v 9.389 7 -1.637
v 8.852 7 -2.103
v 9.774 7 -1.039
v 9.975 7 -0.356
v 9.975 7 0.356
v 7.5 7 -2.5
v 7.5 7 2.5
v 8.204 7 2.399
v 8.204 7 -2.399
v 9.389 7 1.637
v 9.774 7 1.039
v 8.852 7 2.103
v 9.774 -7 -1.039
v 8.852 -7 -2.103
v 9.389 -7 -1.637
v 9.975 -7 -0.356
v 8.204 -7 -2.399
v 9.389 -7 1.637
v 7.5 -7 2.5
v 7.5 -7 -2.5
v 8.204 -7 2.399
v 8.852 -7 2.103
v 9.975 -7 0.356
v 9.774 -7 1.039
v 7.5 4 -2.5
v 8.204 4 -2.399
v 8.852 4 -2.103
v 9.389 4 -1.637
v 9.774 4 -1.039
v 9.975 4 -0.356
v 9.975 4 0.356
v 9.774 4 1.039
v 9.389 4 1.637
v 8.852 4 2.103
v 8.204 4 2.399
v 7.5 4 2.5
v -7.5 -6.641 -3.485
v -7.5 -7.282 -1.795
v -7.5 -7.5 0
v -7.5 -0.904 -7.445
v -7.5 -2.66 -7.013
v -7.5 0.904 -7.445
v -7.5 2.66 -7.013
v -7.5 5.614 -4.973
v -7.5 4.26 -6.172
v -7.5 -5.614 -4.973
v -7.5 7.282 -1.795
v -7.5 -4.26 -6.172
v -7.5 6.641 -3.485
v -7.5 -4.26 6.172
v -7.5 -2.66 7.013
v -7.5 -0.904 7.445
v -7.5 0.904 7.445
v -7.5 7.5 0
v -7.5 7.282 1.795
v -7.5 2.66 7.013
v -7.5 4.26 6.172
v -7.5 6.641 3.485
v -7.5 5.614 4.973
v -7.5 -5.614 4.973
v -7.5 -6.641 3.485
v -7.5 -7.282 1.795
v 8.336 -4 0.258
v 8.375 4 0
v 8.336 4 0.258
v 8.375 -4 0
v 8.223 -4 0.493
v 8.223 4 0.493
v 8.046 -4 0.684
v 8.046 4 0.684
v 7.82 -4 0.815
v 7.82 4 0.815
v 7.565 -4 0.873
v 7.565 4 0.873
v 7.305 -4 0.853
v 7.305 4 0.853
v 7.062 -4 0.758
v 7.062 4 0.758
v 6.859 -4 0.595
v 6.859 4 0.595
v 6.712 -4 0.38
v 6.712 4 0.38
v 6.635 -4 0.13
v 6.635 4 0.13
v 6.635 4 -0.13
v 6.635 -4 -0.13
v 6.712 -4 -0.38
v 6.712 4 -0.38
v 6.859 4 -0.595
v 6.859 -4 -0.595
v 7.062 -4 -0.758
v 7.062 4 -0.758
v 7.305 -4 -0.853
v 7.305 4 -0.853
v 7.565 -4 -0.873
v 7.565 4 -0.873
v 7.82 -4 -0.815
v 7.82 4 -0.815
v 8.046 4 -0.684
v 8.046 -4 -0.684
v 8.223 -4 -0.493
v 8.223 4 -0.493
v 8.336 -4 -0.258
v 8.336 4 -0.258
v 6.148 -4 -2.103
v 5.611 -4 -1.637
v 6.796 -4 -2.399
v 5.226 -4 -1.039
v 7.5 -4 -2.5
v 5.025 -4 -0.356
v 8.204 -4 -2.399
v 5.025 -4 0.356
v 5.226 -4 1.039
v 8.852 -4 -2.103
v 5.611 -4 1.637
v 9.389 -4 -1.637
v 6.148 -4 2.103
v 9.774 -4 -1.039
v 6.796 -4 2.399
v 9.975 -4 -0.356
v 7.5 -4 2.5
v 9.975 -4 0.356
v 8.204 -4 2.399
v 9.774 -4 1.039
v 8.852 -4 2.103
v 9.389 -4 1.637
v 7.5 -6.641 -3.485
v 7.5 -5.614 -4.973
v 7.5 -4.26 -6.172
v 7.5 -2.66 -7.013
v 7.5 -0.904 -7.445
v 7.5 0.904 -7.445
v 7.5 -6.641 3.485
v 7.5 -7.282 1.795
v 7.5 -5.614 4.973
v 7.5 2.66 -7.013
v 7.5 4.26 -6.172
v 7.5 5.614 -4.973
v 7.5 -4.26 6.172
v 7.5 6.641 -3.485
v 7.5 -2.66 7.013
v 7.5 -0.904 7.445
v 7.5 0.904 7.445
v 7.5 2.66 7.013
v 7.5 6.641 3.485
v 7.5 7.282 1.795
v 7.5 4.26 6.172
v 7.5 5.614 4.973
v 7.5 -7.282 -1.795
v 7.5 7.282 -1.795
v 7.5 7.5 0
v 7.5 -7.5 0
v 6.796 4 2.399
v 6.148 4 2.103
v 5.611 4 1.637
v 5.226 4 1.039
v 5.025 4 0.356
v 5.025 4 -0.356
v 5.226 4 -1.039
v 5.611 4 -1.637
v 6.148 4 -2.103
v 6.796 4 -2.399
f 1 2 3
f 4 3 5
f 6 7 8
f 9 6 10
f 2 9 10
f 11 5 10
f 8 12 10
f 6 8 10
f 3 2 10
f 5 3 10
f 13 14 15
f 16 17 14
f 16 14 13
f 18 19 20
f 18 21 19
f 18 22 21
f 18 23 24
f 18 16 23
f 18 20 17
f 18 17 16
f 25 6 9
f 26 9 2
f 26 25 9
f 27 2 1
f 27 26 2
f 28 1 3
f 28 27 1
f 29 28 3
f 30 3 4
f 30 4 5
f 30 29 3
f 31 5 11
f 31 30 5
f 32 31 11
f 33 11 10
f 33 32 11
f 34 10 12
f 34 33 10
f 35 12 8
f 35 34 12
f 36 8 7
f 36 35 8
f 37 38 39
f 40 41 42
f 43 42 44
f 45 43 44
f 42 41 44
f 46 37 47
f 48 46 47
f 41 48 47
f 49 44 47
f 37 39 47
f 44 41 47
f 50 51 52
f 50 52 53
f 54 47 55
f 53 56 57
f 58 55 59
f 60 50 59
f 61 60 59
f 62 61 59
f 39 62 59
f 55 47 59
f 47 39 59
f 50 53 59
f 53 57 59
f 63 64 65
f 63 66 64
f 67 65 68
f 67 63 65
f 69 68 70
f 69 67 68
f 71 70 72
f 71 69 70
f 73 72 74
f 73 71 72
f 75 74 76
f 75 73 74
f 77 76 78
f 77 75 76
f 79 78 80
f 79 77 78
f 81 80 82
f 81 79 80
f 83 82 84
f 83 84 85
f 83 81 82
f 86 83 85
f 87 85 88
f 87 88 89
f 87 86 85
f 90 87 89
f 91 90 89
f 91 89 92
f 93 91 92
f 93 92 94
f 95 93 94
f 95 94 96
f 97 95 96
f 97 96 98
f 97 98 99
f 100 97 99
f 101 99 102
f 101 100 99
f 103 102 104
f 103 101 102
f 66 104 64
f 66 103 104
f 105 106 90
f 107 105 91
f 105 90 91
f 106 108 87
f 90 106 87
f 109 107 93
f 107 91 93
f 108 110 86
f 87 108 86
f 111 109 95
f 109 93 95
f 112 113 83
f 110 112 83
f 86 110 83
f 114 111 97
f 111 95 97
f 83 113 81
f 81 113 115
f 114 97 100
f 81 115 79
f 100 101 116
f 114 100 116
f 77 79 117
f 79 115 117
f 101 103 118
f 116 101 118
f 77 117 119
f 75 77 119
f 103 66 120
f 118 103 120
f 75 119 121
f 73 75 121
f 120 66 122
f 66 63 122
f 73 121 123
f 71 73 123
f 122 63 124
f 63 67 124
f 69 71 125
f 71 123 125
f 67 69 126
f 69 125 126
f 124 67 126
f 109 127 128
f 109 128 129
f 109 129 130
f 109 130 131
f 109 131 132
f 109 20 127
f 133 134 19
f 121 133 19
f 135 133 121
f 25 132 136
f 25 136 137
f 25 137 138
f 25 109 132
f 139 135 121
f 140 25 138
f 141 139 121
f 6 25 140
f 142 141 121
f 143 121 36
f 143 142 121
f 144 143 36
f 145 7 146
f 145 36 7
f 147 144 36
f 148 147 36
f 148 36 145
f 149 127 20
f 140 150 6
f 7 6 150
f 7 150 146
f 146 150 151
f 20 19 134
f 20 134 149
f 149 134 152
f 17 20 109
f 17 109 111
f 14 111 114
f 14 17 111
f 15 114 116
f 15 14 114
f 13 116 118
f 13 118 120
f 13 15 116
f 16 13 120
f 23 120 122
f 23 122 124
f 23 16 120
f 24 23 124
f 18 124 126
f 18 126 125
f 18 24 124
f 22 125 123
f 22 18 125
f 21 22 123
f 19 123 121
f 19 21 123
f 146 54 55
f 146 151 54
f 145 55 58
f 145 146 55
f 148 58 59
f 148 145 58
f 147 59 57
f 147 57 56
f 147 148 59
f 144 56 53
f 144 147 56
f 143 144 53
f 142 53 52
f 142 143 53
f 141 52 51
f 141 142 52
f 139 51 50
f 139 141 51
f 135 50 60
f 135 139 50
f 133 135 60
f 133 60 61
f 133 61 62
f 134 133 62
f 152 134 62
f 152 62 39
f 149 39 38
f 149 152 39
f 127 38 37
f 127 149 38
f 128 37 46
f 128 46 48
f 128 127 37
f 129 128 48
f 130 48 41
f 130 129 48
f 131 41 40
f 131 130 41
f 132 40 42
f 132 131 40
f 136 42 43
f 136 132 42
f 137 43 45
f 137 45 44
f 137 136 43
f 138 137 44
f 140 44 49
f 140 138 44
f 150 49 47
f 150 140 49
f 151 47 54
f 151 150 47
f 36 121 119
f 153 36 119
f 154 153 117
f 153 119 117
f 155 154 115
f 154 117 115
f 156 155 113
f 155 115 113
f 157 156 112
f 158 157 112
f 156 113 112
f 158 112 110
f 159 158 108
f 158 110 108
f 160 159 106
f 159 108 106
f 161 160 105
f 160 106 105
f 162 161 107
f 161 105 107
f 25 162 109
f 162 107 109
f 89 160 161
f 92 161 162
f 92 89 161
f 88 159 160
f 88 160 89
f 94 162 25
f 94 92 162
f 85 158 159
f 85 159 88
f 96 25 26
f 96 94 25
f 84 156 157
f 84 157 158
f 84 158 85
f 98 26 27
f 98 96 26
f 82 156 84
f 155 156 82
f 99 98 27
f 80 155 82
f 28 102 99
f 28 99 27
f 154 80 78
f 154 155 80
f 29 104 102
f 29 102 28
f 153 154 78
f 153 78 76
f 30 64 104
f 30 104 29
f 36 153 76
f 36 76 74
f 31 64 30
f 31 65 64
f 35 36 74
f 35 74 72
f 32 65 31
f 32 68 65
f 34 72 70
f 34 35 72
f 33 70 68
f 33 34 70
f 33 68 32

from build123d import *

# Parameters (mm, degrees)
F0_R     = 7.5
F1_DEPTH = 7.5
F2_R     = 2.5
F3_DEPTH = 7
F4_R     = 2.5
F5_DEPTH = 4
F6_R     = 0.875
F7_DEPTH = 4


with BuildPart() as f1:
    # F0 (on Right) → F1 (new body, symmetric)
    with BuildSketch(Plane.YZ):
        Circle(F0_R)
    extrude(amount=F1_DEPTH, both=True)

    # F2 (on Front) → F3 (join, symmetric)
    with BuildSketch(Plane.XZ):
        with Locations((7.5, 0)):
            Circle(F2_R)
    extrude(amount=F3_DEPTH, both=True)

    # F4 (on Front) → F5 (cut, symmetric)
    with BuildSketch(Plane.XZ):
        with Locations((7.5, 0)):
            Circle(F4_R)
    extrude(amount=F5_DEPTH, both=True, mode=Mode.SUBTRACT)

    # F6 (on Front) → F7 (join, symmetric)
    with BuildSketch(Plane.XZ):
        with Locations((7.5, 0)):
            Circle(F6_R)
    extrude(amount=F7_DEPTH, both=True)


solid = f1.part
